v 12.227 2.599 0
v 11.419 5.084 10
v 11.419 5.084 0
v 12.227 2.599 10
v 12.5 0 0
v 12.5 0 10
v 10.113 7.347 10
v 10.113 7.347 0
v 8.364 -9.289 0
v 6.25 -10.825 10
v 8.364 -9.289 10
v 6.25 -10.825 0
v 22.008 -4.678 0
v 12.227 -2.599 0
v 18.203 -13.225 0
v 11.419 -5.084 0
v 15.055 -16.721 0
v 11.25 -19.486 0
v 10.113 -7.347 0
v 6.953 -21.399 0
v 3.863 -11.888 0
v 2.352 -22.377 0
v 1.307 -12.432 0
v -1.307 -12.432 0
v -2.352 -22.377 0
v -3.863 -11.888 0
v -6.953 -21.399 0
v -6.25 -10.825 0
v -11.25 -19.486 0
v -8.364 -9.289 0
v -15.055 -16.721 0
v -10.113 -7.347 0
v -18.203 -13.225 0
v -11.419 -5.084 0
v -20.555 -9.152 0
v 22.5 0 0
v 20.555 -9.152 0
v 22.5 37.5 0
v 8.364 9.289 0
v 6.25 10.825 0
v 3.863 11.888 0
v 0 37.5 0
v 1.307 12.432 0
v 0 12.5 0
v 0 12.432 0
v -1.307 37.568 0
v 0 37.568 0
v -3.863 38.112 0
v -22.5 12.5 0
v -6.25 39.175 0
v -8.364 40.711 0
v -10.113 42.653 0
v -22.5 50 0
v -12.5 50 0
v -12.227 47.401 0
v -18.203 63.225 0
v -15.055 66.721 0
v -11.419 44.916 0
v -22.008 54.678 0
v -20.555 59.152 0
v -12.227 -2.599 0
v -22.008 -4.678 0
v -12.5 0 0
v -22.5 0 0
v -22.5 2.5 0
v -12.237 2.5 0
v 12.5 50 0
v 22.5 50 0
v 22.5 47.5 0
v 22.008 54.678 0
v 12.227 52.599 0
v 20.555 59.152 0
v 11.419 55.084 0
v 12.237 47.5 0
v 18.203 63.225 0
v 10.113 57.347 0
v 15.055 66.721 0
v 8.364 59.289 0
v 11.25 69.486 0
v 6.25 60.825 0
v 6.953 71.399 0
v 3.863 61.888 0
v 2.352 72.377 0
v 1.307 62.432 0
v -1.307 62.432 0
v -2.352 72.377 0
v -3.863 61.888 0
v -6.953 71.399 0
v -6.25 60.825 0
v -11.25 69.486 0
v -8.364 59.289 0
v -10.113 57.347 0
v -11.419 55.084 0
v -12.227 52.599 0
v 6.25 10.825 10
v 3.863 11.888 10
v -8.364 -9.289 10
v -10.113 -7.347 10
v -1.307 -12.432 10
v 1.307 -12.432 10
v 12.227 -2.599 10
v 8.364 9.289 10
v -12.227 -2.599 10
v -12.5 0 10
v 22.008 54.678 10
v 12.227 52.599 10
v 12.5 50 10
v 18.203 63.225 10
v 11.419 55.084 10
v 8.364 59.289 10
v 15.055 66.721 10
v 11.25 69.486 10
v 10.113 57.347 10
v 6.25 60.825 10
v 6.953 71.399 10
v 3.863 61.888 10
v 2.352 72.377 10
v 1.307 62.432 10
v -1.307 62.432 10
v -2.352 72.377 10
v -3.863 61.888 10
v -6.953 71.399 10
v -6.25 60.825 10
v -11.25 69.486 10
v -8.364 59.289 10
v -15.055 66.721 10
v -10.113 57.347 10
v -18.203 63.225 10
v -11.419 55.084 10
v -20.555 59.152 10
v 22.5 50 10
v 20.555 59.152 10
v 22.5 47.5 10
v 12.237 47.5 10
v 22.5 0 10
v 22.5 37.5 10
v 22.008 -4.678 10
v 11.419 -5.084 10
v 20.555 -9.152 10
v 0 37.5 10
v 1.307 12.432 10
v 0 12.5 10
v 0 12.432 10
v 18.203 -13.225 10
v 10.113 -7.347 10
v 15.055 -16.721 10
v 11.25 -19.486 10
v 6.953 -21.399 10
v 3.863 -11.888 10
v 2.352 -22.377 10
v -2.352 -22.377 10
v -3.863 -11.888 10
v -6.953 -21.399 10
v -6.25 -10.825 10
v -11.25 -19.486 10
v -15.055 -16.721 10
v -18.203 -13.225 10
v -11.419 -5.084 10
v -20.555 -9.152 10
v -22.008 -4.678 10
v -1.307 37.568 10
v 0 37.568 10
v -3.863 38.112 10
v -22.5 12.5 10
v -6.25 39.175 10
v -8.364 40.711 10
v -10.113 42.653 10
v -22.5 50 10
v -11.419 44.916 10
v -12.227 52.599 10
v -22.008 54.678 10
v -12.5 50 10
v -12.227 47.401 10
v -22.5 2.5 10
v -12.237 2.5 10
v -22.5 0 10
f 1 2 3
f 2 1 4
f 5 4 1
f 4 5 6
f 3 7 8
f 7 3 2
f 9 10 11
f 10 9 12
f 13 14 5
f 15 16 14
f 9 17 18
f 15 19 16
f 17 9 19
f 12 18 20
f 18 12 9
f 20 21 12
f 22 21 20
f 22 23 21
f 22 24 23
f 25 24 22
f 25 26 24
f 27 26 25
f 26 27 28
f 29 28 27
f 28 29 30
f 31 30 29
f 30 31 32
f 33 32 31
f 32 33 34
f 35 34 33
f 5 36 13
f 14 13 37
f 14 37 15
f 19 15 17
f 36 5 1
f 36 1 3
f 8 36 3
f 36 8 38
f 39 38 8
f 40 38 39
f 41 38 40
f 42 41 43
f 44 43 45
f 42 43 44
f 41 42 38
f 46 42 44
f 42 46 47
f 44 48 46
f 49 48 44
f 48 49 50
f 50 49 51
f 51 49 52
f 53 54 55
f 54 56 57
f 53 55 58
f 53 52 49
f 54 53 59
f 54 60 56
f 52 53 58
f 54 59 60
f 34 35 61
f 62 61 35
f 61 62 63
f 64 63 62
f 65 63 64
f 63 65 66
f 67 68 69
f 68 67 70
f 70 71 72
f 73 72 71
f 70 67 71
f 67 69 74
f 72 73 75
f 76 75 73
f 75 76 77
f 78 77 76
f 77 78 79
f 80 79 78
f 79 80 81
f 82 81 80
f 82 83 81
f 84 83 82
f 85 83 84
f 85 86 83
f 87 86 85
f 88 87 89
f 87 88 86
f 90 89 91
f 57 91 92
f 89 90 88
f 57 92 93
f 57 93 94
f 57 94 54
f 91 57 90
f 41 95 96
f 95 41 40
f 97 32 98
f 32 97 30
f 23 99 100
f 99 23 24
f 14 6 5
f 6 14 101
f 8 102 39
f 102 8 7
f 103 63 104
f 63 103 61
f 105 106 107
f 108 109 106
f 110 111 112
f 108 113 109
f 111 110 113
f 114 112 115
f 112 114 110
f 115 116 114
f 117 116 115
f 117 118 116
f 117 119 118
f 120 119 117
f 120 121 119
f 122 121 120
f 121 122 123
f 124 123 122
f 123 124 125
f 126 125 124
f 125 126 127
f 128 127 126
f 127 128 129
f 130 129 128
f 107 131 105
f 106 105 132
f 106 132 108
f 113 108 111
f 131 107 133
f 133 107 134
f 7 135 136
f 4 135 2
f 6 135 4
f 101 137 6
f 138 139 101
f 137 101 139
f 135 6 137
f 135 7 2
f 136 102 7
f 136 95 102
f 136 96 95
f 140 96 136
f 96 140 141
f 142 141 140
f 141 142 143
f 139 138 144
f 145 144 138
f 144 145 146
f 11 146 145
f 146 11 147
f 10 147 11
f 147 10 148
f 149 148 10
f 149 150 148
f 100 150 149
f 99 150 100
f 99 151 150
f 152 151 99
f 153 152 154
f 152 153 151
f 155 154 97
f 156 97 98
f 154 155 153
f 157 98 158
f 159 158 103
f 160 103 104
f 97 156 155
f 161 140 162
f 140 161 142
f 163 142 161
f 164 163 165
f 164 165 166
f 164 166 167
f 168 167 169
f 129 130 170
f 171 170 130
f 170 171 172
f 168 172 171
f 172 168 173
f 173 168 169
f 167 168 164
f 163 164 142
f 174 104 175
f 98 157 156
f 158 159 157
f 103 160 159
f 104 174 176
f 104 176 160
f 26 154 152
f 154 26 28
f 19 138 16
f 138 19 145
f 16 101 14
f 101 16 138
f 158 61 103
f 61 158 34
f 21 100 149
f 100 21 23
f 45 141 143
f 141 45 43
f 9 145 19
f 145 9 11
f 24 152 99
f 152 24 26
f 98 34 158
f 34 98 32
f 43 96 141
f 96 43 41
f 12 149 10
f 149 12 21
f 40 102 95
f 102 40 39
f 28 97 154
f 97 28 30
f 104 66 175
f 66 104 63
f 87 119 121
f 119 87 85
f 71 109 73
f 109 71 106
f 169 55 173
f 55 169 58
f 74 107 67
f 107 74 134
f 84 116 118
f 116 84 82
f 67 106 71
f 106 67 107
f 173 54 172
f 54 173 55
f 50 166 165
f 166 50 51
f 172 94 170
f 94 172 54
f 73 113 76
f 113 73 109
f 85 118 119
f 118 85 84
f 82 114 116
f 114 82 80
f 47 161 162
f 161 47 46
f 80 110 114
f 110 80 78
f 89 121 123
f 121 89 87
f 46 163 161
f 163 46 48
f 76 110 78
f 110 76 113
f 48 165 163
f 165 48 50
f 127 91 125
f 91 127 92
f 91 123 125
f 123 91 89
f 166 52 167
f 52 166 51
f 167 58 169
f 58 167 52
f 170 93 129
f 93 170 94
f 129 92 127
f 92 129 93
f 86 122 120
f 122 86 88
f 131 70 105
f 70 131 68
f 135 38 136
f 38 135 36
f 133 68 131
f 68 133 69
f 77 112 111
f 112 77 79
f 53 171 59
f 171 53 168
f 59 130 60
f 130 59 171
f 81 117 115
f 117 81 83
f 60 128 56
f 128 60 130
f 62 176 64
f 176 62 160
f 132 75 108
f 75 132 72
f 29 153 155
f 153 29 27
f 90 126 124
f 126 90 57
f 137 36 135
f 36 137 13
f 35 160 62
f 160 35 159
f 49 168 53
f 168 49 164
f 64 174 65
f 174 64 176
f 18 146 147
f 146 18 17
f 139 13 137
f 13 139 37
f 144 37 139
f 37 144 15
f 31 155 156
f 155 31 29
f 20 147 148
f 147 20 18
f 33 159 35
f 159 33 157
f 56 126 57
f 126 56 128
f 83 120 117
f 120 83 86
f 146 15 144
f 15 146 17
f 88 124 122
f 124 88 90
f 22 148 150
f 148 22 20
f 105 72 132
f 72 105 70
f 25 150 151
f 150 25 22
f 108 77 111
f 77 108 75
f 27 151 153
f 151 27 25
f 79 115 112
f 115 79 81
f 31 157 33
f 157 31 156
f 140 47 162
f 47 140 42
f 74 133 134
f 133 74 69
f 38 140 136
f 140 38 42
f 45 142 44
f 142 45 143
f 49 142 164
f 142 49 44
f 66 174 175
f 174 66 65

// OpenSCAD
_innerDiameterTop=25;
_innerDiameterBot=25;
_innerDistance=50;
_bodyWidth=10;

_hookThickness=10;

_cutY=10;

module s_hook(idt=_innerDiameterTop, idb=_innerDiameterTop, yDelta=_innerDistance, t=_hookThickness, w=_bodyWidth, cy=_cutY) {
    dOuter=idt+2*w;
    module body(d=dOuter) {
        hull() {
            cylinder(d=d, h=t);
            translate([0,yDelta,0]) cylinder(d=d, h=t);
        };
    };
    module holes() {
        cylinder(d=idt, h=t);
        translate([0,yDelta,0]) cylinder(d=idb, h=t);
    };
    module cutRectangle(y=cy, angle=0) {
        x=(idt+2*w)/2;
        translate([0,yDelta/2,t/2])
            cube([x,y,t], center=true);
    };
    //cutRectangle();
    difference() {
        body();
        holes();
        translate([dOuter/4,(yDelta-idt+cy)/2,0])
            cutRectangle();
        translate([-dOuter/4,-(yDelta-idb+cy)/2,0])
            cutRectangle();
    };
};
s_hook();
